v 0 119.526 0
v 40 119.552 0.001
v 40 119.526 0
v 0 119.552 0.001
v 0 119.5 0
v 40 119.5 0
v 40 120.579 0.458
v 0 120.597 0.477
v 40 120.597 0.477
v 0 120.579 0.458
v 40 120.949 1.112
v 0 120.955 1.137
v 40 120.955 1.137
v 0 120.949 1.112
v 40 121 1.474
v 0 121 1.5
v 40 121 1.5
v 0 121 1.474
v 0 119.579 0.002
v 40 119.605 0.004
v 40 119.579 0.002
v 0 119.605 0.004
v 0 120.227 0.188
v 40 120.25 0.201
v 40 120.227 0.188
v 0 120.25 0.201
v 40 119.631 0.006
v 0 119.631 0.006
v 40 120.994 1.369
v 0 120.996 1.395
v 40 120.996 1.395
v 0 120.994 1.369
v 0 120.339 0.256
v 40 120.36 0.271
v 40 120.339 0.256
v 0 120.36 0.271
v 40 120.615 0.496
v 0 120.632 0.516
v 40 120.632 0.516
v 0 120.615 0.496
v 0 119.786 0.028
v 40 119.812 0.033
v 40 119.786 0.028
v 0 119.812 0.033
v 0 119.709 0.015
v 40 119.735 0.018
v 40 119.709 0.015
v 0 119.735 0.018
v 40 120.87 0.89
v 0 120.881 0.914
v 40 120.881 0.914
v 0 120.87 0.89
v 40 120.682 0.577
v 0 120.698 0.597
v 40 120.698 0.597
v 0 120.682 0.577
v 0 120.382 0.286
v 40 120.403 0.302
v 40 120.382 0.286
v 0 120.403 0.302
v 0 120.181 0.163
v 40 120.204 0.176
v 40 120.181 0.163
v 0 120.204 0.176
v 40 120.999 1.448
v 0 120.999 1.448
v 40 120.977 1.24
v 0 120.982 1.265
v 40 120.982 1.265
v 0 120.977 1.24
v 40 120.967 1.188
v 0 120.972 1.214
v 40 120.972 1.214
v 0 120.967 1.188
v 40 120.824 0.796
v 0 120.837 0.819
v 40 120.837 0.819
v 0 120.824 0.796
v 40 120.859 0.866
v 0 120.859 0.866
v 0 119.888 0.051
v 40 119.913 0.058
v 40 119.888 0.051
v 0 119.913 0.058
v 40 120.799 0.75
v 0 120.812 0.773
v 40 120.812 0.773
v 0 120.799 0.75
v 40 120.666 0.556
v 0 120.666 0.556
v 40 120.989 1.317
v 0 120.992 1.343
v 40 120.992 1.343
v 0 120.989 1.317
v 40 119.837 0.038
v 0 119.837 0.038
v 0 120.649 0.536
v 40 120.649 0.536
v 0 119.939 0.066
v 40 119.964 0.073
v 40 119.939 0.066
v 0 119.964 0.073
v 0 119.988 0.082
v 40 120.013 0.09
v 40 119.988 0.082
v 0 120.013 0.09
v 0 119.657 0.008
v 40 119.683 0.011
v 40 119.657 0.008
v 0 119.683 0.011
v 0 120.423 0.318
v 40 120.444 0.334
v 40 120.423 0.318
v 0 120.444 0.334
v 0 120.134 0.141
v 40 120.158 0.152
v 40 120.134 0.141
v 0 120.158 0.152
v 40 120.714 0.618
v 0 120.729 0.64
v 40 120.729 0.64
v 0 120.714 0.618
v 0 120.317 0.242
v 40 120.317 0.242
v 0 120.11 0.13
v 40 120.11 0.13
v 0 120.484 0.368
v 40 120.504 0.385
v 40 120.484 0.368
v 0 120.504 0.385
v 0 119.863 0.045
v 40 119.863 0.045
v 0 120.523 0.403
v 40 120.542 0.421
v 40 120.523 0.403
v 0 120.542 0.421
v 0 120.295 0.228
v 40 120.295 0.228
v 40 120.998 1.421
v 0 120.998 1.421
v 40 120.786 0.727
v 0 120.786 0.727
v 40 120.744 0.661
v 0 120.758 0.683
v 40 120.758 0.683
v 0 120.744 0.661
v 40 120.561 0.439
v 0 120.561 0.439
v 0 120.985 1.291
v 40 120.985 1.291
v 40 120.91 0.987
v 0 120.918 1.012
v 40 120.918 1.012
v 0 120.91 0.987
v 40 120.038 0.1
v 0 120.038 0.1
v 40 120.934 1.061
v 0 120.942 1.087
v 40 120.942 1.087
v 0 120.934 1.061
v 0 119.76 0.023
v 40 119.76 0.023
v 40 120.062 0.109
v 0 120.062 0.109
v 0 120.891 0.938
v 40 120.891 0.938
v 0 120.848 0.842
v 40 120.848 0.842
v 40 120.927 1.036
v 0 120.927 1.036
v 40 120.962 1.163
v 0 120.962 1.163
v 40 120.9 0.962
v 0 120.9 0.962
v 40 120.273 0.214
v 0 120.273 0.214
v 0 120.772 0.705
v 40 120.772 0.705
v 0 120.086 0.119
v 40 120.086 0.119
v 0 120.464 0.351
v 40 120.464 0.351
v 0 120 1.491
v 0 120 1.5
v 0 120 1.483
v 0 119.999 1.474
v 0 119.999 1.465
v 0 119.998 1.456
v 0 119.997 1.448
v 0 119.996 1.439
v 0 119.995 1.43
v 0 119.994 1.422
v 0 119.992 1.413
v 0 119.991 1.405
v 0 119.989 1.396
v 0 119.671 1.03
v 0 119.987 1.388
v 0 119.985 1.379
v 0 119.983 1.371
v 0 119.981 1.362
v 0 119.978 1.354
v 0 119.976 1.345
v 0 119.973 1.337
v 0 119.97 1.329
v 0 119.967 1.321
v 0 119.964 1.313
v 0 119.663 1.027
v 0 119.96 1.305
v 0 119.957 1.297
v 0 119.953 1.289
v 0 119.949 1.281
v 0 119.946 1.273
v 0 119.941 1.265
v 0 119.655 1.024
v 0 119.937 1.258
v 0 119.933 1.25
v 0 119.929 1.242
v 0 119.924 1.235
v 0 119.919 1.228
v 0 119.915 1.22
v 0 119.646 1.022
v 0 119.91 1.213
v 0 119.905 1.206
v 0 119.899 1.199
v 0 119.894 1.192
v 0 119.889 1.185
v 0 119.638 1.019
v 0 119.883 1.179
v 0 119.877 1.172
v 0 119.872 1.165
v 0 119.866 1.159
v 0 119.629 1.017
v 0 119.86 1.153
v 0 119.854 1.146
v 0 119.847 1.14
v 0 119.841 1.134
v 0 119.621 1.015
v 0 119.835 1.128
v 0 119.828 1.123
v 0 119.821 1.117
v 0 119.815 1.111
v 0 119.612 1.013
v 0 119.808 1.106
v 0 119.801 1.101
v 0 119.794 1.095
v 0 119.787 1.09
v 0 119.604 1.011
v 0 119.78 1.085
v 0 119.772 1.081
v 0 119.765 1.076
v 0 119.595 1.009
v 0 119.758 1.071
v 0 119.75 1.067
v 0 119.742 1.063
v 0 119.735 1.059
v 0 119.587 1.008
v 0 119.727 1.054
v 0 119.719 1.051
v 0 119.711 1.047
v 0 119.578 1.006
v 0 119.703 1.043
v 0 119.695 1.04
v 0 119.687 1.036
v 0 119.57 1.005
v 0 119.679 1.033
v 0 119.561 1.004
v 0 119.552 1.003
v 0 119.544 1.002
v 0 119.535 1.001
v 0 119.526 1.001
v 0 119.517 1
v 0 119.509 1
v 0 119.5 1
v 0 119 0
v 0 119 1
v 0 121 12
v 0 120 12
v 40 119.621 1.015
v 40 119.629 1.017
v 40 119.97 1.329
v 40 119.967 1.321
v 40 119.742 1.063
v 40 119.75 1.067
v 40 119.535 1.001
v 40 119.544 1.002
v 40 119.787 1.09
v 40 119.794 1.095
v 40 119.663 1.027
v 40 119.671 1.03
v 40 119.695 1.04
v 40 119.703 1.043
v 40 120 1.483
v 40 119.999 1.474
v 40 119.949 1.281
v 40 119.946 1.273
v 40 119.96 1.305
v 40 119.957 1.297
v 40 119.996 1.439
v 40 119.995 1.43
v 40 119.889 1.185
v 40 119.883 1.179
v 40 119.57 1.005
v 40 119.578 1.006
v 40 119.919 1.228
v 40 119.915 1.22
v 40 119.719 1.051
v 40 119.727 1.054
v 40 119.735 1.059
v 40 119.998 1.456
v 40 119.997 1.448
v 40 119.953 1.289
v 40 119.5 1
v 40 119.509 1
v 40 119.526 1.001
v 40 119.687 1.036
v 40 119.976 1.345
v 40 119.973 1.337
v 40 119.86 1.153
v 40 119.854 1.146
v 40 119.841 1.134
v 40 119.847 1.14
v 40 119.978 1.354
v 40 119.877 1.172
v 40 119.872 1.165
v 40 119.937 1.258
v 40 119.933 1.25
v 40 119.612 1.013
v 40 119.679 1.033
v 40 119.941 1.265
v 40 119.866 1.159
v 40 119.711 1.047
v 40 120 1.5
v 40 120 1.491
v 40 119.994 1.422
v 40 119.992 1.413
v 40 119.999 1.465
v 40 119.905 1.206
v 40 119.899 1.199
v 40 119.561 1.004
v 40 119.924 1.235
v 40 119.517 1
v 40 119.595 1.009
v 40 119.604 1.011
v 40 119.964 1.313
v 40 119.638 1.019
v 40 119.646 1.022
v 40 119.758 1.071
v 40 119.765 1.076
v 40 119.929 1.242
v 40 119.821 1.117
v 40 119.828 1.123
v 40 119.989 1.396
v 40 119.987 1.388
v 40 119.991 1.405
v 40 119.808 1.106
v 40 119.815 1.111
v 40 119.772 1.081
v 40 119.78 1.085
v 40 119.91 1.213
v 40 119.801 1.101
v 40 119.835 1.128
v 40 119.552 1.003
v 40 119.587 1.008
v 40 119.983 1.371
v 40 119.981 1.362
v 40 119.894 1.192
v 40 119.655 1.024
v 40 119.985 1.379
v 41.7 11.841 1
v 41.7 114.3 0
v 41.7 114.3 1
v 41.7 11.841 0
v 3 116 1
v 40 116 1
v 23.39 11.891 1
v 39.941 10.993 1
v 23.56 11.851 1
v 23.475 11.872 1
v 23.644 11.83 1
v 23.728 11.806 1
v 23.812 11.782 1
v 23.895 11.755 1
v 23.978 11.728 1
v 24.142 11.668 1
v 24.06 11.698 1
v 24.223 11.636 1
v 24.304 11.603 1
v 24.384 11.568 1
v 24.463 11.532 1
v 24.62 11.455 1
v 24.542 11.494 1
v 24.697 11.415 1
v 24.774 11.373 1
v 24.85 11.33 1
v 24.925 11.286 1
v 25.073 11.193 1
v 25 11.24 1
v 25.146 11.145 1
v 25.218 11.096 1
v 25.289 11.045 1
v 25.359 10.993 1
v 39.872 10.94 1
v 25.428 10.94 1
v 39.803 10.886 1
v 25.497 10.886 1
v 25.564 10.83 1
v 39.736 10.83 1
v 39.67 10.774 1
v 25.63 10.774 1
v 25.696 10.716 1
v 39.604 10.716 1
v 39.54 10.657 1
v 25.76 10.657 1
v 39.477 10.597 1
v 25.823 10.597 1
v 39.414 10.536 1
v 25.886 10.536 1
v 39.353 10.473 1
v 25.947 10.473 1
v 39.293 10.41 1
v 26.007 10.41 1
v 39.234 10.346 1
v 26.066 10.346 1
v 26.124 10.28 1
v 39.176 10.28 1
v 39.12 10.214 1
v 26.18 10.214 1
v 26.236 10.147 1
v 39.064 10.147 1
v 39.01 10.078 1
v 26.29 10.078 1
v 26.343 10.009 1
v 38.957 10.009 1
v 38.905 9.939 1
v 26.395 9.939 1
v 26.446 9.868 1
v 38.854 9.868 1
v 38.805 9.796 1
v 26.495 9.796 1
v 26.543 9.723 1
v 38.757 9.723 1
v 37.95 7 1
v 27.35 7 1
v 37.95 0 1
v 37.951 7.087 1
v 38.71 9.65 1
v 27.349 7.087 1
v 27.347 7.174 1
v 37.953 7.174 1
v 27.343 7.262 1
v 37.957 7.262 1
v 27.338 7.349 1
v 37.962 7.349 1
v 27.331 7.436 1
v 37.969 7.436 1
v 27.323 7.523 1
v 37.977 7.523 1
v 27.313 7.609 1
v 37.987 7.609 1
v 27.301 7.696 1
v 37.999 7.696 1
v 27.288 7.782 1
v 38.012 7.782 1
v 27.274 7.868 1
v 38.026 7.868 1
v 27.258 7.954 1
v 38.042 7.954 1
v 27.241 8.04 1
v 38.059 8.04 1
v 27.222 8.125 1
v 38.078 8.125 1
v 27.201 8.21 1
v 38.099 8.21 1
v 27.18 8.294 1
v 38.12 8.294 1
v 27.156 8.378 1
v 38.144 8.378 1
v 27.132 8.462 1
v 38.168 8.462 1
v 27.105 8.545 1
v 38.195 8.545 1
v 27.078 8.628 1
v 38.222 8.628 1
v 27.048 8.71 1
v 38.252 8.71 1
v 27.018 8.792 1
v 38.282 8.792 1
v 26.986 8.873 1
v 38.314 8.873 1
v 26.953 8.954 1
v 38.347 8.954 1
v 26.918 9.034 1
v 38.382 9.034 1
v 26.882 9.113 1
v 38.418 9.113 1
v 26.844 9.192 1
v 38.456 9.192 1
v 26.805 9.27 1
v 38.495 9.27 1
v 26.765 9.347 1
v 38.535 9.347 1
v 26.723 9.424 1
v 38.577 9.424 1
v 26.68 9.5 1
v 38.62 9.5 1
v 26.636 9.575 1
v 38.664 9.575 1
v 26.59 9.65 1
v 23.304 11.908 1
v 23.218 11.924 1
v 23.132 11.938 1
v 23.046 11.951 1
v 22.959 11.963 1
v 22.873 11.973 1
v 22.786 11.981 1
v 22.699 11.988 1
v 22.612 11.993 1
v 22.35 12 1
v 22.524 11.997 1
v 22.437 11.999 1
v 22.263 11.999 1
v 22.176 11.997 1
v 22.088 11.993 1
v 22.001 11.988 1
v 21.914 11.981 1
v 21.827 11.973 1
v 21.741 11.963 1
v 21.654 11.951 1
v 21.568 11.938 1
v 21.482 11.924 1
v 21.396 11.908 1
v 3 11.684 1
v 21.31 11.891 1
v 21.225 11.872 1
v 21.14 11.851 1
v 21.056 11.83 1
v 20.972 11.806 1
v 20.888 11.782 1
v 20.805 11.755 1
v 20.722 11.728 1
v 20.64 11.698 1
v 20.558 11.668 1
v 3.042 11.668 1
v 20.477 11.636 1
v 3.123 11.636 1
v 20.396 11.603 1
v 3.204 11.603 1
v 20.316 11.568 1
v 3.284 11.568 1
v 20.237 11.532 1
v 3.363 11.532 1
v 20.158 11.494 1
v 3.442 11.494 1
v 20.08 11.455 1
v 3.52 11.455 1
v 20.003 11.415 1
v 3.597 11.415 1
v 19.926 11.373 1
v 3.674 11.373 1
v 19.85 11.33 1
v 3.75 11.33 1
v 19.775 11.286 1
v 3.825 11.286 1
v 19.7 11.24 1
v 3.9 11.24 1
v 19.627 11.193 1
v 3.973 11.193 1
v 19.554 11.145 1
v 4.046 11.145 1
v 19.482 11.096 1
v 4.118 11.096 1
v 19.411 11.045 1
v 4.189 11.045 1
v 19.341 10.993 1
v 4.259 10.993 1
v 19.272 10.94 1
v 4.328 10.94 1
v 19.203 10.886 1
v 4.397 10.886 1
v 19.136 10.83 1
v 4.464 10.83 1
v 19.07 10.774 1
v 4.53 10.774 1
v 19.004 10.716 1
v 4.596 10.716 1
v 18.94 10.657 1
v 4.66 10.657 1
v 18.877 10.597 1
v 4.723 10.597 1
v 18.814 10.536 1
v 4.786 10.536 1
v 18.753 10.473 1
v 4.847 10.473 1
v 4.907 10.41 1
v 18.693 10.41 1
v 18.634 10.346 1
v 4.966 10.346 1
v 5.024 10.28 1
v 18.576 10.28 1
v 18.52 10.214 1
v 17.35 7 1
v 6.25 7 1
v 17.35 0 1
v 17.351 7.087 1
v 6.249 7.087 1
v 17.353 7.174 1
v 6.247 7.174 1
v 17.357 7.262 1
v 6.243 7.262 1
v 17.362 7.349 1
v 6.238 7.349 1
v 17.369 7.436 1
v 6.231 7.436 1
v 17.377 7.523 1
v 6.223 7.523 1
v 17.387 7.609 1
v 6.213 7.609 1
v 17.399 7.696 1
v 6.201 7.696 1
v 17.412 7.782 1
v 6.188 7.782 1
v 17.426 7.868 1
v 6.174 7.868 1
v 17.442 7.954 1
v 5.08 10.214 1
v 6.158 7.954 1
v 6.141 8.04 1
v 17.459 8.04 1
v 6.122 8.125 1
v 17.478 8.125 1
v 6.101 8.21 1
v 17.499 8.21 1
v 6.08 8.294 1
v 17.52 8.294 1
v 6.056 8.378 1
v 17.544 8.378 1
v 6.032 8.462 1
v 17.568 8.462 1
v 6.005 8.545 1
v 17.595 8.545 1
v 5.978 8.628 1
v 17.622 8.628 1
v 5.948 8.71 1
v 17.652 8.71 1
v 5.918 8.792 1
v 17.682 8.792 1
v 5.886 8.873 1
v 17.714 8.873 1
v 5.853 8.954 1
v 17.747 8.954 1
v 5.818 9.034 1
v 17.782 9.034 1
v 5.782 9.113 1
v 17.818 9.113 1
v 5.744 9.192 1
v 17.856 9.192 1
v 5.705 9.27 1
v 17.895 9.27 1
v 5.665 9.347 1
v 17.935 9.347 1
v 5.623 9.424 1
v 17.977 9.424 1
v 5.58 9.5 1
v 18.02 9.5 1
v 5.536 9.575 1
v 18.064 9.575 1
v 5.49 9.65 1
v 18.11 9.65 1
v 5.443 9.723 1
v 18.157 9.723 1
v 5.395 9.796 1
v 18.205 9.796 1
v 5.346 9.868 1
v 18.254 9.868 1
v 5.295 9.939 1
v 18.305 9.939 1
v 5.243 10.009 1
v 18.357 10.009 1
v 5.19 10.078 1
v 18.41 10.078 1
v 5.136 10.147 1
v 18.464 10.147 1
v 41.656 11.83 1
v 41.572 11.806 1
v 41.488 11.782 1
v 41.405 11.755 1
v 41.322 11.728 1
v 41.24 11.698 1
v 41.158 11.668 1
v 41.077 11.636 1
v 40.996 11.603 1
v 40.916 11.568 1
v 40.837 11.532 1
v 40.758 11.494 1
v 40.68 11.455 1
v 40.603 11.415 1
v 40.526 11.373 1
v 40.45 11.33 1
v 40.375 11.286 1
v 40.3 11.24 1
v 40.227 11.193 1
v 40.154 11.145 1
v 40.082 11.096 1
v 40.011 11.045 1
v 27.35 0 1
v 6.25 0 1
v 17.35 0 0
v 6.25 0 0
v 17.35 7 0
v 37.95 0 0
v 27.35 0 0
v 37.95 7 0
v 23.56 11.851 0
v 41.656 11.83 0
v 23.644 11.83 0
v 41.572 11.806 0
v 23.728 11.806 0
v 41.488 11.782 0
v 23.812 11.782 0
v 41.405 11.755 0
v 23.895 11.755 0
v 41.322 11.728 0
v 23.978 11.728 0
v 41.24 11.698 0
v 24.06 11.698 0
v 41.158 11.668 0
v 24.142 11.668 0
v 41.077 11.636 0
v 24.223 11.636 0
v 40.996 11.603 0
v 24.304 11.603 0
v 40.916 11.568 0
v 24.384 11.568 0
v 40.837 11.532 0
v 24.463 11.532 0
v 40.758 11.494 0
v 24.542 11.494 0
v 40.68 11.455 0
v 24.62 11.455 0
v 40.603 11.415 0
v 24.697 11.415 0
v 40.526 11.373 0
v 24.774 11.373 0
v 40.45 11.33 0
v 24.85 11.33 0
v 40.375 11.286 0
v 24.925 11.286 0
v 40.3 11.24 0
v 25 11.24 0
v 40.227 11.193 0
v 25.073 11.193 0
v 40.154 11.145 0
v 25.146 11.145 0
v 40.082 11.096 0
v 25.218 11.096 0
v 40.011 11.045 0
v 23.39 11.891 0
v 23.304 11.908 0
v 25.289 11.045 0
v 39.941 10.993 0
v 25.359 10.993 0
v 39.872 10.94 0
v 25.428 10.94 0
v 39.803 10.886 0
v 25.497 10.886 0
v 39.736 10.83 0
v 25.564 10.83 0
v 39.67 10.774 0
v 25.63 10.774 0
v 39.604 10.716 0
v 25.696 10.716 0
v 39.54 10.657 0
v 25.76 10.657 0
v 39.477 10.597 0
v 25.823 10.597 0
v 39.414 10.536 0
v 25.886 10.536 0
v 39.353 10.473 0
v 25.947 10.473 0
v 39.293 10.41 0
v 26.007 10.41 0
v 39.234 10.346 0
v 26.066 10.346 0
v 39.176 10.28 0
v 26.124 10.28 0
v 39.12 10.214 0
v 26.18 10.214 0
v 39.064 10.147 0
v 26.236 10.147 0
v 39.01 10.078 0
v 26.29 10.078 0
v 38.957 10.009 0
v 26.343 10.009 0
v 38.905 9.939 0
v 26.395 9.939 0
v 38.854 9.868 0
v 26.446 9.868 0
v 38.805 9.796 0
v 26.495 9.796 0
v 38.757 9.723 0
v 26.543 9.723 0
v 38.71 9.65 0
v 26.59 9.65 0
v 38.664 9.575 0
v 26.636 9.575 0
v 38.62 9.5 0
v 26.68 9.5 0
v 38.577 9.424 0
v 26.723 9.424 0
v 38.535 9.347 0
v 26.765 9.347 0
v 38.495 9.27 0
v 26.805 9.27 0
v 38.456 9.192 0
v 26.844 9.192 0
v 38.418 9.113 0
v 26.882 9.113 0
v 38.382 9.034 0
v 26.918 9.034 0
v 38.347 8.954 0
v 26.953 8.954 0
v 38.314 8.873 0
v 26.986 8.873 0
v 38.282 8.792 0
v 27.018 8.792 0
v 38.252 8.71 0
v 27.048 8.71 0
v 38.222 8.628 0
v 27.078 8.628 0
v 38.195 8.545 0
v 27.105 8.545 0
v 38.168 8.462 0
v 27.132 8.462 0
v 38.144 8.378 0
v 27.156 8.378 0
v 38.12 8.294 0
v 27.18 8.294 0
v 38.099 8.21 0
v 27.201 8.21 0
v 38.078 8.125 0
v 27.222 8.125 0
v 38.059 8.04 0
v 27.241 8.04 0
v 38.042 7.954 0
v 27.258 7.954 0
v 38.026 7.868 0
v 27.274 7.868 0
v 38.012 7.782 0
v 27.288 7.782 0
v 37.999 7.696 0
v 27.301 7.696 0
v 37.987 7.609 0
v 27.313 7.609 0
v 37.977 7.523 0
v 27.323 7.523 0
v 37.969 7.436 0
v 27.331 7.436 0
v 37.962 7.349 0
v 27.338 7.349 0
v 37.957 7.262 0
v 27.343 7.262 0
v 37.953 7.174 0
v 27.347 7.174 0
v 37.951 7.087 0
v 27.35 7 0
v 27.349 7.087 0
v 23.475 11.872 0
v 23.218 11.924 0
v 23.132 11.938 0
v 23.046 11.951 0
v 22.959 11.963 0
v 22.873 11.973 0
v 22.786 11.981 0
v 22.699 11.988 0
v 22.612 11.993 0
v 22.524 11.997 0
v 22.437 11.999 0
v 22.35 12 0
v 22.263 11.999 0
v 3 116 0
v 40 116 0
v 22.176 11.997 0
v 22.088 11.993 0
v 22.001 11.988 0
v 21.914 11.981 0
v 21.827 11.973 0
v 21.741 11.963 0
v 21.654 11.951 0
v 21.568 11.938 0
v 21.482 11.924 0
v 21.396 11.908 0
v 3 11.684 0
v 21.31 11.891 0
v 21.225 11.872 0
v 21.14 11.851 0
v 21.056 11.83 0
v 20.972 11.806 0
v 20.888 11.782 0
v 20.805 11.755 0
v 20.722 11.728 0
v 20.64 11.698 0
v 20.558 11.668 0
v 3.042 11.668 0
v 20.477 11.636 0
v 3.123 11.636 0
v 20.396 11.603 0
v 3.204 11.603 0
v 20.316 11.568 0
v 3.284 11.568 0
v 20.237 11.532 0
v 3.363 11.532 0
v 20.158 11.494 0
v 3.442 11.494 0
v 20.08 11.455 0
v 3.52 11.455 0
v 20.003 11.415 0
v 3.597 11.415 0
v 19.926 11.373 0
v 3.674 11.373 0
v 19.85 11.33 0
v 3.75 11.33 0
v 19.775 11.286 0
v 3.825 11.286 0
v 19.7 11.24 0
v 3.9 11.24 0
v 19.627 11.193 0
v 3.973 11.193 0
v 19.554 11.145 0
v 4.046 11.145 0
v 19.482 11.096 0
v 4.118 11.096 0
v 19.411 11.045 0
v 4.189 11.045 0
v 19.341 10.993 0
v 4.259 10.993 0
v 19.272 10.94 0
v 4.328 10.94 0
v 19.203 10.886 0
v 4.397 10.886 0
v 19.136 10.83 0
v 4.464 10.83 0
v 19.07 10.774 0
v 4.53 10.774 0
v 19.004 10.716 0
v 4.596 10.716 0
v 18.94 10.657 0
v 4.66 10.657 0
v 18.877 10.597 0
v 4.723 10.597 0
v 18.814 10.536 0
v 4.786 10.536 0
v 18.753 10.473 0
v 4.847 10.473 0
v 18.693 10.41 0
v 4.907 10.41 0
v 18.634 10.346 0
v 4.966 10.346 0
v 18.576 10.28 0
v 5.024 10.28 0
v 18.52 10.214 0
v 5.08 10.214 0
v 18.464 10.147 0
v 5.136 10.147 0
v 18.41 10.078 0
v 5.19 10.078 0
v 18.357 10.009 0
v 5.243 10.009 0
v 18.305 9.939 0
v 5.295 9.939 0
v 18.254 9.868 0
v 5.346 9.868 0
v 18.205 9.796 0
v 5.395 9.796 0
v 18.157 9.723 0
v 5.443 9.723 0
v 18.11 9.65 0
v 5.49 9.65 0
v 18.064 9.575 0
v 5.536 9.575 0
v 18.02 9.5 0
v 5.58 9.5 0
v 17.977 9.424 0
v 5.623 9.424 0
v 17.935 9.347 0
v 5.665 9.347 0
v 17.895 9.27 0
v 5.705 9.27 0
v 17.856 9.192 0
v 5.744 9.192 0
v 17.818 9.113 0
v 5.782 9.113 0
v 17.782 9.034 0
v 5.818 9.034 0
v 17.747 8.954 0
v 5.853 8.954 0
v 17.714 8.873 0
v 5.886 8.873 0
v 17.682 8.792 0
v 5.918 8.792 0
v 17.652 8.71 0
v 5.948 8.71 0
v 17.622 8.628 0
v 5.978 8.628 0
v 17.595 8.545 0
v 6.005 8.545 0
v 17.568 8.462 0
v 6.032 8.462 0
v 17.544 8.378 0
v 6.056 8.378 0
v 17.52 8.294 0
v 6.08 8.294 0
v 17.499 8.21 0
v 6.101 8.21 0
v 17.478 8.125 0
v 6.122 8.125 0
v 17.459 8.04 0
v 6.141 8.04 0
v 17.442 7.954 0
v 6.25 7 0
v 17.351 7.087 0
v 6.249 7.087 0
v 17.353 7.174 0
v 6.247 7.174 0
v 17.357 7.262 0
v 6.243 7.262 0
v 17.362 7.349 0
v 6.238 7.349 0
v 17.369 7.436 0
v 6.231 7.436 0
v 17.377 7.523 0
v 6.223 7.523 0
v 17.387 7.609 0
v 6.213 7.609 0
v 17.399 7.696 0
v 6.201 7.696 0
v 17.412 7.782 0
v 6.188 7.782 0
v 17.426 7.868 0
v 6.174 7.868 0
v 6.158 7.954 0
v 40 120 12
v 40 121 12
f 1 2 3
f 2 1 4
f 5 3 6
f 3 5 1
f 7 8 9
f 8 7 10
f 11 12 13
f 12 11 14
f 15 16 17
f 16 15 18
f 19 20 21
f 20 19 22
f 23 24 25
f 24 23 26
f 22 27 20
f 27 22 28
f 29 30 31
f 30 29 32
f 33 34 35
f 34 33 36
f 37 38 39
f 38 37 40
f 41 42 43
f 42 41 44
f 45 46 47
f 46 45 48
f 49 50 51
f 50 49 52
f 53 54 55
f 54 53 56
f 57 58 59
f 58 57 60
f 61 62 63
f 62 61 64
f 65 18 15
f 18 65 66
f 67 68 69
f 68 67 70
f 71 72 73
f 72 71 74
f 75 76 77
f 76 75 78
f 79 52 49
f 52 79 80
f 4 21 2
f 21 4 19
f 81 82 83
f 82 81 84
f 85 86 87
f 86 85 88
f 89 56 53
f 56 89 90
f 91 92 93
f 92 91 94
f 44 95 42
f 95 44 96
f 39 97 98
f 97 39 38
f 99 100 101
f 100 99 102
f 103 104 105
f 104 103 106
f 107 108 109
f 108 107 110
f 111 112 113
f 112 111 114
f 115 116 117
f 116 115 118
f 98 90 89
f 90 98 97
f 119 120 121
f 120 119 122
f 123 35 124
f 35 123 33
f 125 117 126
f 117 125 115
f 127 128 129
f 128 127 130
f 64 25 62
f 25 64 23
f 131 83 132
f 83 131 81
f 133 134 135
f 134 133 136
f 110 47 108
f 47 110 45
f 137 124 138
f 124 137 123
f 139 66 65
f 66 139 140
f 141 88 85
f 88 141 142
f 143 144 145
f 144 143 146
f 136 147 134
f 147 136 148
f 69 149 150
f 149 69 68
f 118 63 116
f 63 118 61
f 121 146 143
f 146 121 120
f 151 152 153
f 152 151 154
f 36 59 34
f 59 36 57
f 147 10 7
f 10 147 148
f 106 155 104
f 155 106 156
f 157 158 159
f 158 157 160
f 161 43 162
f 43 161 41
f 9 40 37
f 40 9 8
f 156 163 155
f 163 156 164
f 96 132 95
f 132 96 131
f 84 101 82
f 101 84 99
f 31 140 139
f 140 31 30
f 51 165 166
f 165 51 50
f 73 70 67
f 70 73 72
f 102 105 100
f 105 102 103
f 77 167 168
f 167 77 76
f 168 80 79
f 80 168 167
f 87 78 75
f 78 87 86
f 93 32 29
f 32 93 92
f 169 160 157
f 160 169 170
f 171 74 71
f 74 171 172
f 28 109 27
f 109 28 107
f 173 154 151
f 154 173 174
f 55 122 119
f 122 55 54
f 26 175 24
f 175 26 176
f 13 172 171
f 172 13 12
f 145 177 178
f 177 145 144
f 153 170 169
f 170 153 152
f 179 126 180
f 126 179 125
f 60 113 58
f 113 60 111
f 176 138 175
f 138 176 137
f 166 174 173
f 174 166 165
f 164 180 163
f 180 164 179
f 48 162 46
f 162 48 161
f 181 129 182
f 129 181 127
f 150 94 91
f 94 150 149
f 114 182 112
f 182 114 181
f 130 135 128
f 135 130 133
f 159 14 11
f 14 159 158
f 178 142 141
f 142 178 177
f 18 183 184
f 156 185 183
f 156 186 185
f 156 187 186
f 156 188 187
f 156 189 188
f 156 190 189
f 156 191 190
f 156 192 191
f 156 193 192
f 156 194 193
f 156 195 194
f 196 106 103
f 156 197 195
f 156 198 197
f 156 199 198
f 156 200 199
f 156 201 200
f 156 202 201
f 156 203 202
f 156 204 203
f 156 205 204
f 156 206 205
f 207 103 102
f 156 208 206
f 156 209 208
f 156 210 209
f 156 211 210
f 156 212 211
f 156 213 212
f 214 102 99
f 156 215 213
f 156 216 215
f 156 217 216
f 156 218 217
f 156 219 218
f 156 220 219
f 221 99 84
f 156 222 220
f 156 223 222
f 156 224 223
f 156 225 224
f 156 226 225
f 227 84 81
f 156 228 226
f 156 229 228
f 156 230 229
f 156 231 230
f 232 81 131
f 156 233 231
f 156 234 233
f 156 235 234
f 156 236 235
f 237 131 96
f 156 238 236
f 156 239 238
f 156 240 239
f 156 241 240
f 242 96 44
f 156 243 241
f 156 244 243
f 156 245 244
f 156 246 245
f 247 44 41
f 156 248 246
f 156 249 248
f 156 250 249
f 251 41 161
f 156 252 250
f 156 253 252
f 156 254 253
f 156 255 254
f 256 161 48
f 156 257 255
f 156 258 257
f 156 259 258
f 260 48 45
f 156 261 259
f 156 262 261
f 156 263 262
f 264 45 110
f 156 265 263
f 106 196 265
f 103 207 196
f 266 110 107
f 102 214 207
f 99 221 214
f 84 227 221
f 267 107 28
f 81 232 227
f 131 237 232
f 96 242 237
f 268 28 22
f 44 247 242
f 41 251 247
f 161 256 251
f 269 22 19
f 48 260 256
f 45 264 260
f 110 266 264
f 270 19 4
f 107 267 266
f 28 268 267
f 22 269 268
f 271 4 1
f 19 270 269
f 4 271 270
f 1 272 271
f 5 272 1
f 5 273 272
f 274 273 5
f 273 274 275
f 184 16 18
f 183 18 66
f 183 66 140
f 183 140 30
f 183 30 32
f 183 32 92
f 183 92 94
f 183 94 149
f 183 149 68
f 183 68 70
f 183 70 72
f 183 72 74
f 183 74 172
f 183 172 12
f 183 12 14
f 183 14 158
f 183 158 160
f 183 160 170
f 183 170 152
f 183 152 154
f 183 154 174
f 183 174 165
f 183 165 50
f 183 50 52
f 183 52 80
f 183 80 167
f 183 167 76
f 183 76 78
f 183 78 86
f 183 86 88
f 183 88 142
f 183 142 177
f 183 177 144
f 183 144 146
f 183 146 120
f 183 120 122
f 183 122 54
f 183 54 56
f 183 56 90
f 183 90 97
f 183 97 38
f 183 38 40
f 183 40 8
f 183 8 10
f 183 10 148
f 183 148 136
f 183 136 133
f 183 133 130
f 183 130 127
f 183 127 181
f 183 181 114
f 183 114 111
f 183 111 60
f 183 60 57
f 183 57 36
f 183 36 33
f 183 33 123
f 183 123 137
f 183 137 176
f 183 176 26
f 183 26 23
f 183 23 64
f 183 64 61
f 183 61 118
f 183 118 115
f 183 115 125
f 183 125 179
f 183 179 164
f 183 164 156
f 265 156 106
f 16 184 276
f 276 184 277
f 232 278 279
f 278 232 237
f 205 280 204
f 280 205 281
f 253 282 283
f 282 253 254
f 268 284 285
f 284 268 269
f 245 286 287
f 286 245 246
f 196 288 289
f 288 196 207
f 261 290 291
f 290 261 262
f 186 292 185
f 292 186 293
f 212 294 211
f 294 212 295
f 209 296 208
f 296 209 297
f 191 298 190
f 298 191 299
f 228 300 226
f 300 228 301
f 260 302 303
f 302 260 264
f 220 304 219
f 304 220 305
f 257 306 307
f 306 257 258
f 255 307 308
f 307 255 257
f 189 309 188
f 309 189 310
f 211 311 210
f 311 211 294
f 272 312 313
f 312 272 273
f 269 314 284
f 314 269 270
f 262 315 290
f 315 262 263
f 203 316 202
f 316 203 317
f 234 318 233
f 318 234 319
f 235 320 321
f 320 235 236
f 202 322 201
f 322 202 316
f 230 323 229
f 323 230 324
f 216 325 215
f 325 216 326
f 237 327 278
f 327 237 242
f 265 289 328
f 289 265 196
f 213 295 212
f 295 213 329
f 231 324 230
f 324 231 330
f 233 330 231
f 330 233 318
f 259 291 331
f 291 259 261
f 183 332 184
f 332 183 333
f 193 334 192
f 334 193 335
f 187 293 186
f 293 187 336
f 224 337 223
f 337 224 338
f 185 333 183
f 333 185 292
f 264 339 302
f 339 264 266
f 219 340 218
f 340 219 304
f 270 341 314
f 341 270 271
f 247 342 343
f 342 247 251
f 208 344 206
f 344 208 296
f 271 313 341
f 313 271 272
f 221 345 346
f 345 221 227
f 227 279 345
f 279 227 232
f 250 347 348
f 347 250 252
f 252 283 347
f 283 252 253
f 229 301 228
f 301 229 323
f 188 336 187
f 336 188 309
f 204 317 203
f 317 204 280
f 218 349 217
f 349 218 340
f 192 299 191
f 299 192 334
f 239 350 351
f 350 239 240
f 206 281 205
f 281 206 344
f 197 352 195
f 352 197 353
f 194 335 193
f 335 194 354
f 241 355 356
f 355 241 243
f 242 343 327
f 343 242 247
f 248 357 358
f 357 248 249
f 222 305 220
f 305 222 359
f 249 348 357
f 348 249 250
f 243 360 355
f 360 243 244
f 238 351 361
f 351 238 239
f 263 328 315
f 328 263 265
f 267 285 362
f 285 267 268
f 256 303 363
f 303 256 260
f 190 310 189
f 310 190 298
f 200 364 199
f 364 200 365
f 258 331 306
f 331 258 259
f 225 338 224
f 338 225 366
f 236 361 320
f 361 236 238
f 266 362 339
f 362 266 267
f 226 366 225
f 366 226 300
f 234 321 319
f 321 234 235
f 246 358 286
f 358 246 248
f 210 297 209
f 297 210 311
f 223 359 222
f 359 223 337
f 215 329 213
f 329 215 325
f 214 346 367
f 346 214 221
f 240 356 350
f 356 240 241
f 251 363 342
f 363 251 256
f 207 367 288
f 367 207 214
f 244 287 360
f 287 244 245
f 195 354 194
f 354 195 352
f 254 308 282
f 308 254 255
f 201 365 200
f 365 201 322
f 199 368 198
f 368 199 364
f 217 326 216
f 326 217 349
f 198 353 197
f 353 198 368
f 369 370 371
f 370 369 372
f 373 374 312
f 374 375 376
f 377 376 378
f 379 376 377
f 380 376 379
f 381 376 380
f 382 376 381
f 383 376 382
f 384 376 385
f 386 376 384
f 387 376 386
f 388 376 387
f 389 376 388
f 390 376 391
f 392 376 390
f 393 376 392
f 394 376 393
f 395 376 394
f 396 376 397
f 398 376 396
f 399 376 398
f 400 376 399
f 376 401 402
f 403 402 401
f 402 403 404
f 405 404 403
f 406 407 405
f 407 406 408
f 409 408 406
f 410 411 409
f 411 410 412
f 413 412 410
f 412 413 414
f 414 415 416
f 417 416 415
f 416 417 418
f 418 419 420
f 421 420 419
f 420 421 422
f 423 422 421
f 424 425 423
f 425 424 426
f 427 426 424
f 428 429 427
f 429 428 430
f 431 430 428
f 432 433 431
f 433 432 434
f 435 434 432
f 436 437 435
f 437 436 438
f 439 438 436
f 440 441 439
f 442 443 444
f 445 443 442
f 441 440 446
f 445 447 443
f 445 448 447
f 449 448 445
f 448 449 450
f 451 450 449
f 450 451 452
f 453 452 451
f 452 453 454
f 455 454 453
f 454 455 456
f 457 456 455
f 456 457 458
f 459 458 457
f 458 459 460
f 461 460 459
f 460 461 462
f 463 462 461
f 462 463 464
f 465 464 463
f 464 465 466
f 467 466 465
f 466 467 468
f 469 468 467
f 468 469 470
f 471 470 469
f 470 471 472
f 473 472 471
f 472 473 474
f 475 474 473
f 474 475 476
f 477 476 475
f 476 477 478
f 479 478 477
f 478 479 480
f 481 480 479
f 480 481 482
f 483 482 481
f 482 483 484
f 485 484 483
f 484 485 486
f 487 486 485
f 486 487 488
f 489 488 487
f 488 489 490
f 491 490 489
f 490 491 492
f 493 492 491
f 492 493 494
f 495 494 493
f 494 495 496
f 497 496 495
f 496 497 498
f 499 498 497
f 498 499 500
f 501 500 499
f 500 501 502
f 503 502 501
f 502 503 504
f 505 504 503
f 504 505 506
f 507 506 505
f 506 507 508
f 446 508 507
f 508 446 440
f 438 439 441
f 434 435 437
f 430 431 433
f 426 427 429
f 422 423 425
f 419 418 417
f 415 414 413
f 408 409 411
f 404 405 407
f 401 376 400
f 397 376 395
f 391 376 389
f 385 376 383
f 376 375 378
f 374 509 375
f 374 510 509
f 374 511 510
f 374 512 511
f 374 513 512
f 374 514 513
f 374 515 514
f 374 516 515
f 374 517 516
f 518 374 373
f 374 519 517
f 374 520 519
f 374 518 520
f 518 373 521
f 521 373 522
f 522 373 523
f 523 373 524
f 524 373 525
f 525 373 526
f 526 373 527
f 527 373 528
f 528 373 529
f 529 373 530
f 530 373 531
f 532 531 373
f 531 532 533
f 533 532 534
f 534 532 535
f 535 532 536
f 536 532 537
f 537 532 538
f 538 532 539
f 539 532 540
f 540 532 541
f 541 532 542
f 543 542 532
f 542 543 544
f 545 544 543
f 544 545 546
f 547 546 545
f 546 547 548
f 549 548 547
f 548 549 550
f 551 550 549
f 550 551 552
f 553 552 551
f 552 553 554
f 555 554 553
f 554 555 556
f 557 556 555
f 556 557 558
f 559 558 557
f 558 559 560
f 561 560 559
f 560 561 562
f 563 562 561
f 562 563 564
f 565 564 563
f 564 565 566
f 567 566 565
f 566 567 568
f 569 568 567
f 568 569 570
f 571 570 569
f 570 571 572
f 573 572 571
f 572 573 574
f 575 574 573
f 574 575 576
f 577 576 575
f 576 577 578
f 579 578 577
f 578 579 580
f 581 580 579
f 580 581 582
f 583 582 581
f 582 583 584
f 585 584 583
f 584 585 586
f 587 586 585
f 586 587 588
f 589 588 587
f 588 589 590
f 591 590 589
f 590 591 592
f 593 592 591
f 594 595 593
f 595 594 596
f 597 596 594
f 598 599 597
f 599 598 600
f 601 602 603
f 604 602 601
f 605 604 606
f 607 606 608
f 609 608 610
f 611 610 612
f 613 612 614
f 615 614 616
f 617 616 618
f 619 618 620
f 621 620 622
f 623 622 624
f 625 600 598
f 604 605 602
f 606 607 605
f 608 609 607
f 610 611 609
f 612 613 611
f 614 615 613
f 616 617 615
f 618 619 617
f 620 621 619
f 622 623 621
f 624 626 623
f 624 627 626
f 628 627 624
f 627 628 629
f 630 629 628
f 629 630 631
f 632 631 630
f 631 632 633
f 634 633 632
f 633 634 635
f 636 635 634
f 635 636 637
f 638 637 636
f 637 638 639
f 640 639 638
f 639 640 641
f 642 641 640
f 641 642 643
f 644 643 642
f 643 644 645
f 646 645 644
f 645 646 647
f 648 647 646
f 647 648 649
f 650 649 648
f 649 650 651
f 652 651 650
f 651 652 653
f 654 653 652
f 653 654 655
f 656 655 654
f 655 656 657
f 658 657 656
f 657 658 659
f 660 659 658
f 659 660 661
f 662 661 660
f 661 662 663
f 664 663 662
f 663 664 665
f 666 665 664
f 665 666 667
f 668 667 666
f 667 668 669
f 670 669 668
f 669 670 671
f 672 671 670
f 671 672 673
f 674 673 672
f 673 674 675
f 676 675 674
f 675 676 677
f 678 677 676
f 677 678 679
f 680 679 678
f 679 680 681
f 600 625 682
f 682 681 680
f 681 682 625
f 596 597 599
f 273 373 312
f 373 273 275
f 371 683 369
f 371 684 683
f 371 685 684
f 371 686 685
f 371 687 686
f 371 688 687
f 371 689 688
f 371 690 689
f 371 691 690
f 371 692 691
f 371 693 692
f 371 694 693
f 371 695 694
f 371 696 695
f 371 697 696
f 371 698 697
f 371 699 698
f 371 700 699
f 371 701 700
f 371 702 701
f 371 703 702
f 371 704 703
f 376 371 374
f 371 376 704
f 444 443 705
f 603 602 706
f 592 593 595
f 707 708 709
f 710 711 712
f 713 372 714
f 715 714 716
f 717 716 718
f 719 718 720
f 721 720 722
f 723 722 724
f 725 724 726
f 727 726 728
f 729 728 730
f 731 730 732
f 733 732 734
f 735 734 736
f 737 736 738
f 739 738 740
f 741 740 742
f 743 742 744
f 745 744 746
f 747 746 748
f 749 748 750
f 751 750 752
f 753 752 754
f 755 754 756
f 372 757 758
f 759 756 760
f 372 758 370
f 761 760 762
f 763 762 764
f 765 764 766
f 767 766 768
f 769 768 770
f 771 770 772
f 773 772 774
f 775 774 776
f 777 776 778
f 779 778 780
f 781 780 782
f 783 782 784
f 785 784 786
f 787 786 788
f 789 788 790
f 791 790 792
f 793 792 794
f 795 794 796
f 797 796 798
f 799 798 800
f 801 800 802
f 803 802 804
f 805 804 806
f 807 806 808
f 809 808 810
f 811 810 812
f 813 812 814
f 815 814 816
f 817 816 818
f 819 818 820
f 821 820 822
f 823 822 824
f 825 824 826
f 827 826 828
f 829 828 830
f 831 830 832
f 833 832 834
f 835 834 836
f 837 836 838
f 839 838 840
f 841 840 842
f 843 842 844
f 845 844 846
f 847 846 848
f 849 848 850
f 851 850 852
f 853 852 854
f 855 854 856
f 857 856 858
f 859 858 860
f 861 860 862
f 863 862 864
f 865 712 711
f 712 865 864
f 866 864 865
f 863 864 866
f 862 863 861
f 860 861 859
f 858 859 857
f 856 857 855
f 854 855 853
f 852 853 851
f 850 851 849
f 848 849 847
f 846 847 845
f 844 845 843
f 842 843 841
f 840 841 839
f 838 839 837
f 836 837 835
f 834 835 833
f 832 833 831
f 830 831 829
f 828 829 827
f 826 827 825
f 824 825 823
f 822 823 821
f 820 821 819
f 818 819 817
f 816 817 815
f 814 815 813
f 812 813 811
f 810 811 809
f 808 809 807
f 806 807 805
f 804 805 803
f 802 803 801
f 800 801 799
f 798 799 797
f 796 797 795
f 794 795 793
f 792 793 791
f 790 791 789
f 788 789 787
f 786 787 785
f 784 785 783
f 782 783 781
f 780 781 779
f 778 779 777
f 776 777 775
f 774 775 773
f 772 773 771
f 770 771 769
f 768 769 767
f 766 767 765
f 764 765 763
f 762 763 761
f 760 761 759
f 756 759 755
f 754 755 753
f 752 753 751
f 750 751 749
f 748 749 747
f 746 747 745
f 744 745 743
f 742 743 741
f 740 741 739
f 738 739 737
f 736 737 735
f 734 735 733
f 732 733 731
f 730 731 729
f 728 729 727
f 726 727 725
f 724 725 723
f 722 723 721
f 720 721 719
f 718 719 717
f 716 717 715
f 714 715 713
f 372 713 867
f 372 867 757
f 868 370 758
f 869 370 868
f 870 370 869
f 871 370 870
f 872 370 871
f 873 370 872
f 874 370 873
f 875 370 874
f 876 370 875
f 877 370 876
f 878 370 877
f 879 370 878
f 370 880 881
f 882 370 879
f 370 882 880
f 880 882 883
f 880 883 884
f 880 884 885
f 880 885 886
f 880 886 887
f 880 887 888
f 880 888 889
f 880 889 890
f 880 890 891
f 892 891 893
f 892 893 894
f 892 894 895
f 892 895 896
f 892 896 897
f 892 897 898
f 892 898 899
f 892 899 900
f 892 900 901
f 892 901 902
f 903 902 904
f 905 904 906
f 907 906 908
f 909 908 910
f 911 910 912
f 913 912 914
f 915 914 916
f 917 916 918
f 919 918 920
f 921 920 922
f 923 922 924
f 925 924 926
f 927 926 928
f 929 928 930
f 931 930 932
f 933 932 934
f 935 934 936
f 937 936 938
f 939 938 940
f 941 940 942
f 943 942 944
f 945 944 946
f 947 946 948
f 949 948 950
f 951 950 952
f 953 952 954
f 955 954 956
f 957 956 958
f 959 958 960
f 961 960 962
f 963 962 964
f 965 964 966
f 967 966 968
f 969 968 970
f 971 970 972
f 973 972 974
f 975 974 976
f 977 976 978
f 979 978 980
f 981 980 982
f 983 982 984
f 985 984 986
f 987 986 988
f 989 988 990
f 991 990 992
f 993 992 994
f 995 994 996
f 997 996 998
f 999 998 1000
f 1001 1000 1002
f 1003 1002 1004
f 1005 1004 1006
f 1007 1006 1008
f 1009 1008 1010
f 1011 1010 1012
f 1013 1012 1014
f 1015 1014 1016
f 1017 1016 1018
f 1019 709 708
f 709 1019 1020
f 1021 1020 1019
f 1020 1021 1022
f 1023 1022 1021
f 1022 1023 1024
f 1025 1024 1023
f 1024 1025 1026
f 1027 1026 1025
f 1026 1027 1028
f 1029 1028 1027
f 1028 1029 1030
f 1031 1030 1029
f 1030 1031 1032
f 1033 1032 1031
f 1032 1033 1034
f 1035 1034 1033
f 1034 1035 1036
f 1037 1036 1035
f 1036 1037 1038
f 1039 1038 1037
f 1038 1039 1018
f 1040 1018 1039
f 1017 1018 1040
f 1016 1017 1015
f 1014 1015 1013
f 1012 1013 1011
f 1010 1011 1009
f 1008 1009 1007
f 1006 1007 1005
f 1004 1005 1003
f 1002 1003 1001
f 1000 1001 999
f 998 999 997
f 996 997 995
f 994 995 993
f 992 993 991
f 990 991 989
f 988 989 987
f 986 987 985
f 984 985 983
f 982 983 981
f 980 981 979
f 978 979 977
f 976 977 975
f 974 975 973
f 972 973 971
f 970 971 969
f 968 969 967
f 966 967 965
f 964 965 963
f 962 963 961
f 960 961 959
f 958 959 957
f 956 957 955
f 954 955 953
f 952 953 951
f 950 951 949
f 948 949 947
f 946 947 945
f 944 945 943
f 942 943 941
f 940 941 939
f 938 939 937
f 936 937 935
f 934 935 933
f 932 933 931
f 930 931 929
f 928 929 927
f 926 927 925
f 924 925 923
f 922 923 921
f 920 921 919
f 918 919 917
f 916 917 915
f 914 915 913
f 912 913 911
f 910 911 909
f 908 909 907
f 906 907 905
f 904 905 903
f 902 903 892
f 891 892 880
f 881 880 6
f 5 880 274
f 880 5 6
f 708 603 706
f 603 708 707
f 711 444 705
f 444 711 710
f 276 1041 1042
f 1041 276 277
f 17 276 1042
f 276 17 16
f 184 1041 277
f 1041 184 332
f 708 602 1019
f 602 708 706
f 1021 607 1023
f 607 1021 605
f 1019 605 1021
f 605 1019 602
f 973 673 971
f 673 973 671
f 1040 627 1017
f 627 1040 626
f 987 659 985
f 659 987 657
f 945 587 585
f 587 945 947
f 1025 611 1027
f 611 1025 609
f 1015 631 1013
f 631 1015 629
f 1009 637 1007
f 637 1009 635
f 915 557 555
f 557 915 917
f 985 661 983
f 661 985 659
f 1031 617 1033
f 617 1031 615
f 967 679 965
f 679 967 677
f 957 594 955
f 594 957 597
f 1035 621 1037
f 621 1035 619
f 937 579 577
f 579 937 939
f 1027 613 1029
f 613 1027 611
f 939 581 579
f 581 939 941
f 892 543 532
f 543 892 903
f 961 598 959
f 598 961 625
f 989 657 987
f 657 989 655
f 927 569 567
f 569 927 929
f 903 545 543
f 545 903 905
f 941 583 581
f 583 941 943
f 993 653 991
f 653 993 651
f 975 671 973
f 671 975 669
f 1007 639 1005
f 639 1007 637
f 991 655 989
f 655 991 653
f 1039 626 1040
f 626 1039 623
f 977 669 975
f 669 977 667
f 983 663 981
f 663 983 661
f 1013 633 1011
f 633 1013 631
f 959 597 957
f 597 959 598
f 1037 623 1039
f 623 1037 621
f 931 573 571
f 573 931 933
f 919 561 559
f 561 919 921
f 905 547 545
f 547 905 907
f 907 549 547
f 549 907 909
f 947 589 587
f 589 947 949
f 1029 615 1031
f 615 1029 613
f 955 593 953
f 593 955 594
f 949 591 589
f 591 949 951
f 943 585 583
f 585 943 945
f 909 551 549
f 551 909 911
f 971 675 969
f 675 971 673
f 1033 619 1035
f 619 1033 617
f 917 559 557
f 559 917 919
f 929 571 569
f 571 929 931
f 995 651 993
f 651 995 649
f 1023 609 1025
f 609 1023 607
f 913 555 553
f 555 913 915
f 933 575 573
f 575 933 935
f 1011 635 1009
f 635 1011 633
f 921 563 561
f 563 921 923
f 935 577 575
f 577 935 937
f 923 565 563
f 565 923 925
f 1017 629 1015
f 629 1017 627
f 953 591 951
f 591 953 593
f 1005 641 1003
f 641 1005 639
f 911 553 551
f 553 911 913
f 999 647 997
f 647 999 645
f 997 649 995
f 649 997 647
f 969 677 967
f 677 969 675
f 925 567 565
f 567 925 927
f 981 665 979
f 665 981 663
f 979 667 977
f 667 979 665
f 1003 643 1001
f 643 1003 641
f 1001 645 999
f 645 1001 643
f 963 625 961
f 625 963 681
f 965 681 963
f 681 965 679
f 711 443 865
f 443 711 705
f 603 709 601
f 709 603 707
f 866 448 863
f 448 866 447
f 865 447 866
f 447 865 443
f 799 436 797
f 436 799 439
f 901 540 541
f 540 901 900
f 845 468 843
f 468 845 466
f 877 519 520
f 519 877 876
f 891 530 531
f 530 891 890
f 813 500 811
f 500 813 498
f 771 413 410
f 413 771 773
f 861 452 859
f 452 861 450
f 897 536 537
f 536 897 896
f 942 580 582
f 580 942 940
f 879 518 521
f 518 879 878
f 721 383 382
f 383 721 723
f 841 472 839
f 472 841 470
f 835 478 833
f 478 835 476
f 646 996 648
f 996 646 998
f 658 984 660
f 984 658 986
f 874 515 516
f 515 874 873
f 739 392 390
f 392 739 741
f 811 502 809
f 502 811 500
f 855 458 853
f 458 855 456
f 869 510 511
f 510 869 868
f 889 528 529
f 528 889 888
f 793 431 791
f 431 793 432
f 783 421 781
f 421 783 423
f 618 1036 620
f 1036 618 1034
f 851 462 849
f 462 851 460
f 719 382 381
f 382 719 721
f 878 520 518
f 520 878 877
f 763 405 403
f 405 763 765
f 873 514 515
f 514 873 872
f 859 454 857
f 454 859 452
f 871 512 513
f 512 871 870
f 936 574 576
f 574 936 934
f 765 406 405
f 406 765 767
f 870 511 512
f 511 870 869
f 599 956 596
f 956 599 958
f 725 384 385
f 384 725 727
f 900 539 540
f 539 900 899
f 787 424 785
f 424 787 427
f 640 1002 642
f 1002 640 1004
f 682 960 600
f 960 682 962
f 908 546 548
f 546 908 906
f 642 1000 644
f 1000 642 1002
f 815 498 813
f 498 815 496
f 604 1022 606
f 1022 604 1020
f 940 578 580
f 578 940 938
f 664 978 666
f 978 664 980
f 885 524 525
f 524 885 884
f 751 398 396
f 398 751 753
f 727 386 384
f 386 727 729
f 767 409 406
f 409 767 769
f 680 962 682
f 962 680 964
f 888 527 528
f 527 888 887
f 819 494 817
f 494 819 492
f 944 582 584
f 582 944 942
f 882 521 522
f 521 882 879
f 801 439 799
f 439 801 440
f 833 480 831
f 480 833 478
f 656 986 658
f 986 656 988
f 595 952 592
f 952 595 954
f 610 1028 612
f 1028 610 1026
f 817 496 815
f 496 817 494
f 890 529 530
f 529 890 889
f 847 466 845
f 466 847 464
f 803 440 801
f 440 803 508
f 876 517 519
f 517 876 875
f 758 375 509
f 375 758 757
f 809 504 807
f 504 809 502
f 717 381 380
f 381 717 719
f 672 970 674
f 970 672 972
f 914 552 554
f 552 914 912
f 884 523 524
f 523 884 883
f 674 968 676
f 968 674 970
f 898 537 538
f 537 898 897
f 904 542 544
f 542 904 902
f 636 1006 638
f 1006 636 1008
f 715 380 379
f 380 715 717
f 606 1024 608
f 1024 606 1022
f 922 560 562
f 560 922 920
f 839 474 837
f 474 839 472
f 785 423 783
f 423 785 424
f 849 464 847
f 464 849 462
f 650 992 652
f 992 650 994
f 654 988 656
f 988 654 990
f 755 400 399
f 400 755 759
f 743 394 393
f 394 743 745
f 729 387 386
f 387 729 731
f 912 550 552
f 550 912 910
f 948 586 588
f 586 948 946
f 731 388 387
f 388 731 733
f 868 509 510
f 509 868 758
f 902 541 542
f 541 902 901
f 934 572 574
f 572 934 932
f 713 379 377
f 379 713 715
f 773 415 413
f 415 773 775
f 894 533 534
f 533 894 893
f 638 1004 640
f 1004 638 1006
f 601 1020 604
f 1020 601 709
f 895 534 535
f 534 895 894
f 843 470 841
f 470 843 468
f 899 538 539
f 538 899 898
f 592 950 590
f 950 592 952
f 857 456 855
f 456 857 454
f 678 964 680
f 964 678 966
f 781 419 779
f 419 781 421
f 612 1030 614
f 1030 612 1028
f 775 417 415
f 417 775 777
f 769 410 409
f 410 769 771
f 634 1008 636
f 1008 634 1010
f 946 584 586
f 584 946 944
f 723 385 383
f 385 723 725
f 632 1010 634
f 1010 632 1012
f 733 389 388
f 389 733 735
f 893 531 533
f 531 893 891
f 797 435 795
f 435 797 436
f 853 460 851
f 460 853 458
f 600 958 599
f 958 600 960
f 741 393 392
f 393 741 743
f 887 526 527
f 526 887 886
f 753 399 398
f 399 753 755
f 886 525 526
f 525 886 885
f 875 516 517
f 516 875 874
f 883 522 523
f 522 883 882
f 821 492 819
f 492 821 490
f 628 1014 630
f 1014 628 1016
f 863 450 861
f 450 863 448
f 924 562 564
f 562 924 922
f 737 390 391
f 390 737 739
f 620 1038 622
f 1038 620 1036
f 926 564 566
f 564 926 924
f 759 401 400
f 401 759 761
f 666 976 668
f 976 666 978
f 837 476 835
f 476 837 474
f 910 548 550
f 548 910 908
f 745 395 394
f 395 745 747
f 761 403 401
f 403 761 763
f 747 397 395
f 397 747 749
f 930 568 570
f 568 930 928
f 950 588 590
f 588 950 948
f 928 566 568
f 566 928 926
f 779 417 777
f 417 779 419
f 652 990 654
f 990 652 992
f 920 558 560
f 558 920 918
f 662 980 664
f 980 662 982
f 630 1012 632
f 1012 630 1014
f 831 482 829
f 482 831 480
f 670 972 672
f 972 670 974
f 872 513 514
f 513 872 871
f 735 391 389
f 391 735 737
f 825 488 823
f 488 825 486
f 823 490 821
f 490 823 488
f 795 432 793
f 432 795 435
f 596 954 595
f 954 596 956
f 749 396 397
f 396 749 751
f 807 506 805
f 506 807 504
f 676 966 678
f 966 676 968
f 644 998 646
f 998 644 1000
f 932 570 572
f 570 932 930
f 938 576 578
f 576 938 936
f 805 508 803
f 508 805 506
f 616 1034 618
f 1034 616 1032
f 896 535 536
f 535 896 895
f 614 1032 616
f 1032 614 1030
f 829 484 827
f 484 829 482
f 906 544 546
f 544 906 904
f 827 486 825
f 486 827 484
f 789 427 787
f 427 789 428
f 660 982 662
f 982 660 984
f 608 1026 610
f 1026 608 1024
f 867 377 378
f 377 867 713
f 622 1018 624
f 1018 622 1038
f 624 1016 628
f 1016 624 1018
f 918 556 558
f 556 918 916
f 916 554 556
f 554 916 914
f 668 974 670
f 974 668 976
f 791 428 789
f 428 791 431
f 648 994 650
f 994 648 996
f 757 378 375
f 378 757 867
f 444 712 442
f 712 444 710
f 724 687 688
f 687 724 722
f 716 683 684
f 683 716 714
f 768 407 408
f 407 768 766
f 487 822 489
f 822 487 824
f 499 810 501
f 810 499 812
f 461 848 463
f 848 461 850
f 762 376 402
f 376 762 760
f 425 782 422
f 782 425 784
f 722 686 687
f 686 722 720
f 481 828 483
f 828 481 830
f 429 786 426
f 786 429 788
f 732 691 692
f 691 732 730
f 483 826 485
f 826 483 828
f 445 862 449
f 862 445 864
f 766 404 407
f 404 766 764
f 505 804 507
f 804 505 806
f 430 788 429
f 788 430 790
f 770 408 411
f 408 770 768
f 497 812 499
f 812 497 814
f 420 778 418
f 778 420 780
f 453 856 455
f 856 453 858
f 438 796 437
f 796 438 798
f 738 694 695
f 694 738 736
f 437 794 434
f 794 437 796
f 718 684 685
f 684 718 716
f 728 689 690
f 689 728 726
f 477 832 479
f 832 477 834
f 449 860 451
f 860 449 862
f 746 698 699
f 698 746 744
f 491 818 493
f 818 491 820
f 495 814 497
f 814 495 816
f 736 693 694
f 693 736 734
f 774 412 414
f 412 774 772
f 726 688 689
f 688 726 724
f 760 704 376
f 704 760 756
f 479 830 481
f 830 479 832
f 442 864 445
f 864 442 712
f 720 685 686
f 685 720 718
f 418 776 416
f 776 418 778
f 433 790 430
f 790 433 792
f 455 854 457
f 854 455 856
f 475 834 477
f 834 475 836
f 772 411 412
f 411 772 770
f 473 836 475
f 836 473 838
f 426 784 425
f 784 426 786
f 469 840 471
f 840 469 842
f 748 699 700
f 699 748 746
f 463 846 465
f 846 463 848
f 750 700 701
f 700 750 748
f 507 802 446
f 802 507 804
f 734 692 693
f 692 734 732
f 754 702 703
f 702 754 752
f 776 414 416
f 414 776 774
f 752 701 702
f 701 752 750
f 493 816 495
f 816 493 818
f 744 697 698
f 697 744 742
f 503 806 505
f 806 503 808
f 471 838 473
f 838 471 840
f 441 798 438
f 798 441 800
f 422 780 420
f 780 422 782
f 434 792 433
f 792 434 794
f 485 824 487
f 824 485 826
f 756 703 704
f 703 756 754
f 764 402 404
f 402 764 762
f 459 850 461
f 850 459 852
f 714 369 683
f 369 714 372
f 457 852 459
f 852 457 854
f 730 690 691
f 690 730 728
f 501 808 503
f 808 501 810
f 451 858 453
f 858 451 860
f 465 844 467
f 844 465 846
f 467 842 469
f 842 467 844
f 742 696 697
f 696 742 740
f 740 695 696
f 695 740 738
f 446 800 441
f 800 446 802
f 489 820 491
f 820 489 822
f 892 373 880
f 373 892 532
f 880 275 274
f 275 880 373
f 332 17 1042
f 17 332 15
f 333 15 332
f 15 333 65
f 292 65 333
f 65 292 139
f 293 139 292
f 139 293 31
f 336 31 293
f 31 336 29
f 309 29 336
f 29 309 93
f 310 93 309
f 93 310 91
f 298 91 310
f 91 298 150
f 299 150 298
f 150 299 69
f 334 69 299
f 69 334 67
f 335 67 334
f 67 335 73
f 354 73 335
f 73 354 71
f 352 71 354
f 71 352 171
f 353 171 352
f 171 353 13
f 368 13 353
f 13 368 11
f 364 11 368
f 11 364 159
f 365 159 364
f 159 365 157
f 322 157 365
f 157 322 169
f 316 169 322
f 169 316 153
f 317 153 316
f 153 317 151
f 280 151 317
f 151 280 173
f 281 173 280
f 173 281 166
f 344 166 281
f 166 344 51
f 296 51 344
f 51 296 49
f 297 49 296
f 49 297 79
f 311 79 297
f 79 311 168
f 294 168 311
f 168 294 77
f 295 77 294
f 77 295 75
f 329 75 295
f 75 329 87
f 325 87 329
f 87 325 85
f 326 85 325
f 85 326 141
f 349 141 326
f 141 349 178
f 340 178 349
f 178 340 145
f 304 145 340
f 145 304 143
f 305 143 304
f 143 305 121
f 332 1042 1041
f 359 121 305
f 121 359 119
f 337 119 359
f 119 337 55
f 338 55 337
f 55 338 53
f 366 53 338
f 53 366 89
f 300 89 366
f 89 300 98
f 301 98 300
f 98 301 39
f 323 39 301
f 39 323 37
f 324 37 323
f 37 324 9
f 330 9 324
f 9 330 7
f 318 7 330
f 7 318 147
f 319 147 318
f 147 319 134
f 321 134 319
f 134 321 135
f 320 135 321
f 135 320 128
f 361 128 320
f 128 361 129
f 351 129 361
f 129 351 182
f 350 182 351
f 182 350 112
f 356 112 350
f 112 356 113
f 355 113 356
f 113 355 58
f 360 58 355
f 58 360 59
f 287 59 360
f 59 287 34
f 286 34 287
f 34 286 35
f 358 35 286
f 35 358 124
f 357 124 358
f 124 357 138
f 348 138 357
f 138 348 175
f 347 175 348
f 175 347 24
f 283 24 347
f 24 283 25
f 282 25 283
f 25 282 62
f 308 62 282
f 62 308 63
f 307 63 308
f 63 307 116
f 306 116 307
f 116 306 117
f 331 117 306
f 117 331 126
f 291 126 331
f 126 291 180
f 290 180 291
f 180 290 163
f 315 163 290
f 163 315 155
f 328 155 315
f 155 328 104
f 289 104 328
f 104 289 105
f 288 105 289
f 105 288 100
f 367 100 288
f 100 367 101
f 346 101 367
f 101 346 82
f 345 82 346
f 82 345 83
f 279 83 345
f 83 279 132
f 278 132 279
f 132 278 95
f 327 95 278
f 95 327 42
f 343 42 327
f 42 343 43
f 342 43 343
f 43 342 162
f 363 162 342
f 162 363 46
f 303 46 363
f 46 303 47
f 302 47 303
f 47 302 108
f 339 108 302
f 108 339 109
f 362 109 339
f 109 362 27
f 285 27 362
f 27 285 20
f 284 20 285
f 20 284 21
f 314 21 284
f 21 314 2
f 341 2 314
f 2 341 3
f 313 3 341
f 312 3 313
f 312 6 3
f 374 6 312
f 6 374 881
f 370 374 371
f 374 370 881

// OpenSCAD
$fn=360;

plate();


module plate() {
    difference() {
        outline();
        translate([-1,-1,-1]) cube([4,117,3]);
        translate([3,116,-1]) rotate([0,0,135]) cube([5,4,3]);
        translate([40,116,-1]) cube([4,6,14]);
        translate([40,116,-1]) rotate([0,0,-45]) cube([5,4,3]);
        translate([-3.75,-1,-1]) {
            cube([10,8,3]);
            translate([5,8,0]) cylinder(h=3, r=5);
        }
        translate([17.35,-1,-1]) {
            cube([10,8,3]);
            translate([5,8,0]) cylinder(h=3, r=5);
        }
        translate([37.95,-1,-1]) {
            cube([10,8,3]);
            translate([5,8,0]) cylinder(h=3, r=5);
        }
    }
         
}

module outline() {
    cube([41.7,119.5,1]);
    translate([0,120,1.5]) cube([42,1,10.5]);
    translate([0,119.5,0]) intersection() {
        translate([0,0,1.5]) rotate([0,90,0]) difference() {
            cylinder(h=42, r=1.5);
            translate([0,0,-1]) cylinder(h=44, r=0.5);
        };
        cube([43,1.5 ,1.5]);
    };    
}
